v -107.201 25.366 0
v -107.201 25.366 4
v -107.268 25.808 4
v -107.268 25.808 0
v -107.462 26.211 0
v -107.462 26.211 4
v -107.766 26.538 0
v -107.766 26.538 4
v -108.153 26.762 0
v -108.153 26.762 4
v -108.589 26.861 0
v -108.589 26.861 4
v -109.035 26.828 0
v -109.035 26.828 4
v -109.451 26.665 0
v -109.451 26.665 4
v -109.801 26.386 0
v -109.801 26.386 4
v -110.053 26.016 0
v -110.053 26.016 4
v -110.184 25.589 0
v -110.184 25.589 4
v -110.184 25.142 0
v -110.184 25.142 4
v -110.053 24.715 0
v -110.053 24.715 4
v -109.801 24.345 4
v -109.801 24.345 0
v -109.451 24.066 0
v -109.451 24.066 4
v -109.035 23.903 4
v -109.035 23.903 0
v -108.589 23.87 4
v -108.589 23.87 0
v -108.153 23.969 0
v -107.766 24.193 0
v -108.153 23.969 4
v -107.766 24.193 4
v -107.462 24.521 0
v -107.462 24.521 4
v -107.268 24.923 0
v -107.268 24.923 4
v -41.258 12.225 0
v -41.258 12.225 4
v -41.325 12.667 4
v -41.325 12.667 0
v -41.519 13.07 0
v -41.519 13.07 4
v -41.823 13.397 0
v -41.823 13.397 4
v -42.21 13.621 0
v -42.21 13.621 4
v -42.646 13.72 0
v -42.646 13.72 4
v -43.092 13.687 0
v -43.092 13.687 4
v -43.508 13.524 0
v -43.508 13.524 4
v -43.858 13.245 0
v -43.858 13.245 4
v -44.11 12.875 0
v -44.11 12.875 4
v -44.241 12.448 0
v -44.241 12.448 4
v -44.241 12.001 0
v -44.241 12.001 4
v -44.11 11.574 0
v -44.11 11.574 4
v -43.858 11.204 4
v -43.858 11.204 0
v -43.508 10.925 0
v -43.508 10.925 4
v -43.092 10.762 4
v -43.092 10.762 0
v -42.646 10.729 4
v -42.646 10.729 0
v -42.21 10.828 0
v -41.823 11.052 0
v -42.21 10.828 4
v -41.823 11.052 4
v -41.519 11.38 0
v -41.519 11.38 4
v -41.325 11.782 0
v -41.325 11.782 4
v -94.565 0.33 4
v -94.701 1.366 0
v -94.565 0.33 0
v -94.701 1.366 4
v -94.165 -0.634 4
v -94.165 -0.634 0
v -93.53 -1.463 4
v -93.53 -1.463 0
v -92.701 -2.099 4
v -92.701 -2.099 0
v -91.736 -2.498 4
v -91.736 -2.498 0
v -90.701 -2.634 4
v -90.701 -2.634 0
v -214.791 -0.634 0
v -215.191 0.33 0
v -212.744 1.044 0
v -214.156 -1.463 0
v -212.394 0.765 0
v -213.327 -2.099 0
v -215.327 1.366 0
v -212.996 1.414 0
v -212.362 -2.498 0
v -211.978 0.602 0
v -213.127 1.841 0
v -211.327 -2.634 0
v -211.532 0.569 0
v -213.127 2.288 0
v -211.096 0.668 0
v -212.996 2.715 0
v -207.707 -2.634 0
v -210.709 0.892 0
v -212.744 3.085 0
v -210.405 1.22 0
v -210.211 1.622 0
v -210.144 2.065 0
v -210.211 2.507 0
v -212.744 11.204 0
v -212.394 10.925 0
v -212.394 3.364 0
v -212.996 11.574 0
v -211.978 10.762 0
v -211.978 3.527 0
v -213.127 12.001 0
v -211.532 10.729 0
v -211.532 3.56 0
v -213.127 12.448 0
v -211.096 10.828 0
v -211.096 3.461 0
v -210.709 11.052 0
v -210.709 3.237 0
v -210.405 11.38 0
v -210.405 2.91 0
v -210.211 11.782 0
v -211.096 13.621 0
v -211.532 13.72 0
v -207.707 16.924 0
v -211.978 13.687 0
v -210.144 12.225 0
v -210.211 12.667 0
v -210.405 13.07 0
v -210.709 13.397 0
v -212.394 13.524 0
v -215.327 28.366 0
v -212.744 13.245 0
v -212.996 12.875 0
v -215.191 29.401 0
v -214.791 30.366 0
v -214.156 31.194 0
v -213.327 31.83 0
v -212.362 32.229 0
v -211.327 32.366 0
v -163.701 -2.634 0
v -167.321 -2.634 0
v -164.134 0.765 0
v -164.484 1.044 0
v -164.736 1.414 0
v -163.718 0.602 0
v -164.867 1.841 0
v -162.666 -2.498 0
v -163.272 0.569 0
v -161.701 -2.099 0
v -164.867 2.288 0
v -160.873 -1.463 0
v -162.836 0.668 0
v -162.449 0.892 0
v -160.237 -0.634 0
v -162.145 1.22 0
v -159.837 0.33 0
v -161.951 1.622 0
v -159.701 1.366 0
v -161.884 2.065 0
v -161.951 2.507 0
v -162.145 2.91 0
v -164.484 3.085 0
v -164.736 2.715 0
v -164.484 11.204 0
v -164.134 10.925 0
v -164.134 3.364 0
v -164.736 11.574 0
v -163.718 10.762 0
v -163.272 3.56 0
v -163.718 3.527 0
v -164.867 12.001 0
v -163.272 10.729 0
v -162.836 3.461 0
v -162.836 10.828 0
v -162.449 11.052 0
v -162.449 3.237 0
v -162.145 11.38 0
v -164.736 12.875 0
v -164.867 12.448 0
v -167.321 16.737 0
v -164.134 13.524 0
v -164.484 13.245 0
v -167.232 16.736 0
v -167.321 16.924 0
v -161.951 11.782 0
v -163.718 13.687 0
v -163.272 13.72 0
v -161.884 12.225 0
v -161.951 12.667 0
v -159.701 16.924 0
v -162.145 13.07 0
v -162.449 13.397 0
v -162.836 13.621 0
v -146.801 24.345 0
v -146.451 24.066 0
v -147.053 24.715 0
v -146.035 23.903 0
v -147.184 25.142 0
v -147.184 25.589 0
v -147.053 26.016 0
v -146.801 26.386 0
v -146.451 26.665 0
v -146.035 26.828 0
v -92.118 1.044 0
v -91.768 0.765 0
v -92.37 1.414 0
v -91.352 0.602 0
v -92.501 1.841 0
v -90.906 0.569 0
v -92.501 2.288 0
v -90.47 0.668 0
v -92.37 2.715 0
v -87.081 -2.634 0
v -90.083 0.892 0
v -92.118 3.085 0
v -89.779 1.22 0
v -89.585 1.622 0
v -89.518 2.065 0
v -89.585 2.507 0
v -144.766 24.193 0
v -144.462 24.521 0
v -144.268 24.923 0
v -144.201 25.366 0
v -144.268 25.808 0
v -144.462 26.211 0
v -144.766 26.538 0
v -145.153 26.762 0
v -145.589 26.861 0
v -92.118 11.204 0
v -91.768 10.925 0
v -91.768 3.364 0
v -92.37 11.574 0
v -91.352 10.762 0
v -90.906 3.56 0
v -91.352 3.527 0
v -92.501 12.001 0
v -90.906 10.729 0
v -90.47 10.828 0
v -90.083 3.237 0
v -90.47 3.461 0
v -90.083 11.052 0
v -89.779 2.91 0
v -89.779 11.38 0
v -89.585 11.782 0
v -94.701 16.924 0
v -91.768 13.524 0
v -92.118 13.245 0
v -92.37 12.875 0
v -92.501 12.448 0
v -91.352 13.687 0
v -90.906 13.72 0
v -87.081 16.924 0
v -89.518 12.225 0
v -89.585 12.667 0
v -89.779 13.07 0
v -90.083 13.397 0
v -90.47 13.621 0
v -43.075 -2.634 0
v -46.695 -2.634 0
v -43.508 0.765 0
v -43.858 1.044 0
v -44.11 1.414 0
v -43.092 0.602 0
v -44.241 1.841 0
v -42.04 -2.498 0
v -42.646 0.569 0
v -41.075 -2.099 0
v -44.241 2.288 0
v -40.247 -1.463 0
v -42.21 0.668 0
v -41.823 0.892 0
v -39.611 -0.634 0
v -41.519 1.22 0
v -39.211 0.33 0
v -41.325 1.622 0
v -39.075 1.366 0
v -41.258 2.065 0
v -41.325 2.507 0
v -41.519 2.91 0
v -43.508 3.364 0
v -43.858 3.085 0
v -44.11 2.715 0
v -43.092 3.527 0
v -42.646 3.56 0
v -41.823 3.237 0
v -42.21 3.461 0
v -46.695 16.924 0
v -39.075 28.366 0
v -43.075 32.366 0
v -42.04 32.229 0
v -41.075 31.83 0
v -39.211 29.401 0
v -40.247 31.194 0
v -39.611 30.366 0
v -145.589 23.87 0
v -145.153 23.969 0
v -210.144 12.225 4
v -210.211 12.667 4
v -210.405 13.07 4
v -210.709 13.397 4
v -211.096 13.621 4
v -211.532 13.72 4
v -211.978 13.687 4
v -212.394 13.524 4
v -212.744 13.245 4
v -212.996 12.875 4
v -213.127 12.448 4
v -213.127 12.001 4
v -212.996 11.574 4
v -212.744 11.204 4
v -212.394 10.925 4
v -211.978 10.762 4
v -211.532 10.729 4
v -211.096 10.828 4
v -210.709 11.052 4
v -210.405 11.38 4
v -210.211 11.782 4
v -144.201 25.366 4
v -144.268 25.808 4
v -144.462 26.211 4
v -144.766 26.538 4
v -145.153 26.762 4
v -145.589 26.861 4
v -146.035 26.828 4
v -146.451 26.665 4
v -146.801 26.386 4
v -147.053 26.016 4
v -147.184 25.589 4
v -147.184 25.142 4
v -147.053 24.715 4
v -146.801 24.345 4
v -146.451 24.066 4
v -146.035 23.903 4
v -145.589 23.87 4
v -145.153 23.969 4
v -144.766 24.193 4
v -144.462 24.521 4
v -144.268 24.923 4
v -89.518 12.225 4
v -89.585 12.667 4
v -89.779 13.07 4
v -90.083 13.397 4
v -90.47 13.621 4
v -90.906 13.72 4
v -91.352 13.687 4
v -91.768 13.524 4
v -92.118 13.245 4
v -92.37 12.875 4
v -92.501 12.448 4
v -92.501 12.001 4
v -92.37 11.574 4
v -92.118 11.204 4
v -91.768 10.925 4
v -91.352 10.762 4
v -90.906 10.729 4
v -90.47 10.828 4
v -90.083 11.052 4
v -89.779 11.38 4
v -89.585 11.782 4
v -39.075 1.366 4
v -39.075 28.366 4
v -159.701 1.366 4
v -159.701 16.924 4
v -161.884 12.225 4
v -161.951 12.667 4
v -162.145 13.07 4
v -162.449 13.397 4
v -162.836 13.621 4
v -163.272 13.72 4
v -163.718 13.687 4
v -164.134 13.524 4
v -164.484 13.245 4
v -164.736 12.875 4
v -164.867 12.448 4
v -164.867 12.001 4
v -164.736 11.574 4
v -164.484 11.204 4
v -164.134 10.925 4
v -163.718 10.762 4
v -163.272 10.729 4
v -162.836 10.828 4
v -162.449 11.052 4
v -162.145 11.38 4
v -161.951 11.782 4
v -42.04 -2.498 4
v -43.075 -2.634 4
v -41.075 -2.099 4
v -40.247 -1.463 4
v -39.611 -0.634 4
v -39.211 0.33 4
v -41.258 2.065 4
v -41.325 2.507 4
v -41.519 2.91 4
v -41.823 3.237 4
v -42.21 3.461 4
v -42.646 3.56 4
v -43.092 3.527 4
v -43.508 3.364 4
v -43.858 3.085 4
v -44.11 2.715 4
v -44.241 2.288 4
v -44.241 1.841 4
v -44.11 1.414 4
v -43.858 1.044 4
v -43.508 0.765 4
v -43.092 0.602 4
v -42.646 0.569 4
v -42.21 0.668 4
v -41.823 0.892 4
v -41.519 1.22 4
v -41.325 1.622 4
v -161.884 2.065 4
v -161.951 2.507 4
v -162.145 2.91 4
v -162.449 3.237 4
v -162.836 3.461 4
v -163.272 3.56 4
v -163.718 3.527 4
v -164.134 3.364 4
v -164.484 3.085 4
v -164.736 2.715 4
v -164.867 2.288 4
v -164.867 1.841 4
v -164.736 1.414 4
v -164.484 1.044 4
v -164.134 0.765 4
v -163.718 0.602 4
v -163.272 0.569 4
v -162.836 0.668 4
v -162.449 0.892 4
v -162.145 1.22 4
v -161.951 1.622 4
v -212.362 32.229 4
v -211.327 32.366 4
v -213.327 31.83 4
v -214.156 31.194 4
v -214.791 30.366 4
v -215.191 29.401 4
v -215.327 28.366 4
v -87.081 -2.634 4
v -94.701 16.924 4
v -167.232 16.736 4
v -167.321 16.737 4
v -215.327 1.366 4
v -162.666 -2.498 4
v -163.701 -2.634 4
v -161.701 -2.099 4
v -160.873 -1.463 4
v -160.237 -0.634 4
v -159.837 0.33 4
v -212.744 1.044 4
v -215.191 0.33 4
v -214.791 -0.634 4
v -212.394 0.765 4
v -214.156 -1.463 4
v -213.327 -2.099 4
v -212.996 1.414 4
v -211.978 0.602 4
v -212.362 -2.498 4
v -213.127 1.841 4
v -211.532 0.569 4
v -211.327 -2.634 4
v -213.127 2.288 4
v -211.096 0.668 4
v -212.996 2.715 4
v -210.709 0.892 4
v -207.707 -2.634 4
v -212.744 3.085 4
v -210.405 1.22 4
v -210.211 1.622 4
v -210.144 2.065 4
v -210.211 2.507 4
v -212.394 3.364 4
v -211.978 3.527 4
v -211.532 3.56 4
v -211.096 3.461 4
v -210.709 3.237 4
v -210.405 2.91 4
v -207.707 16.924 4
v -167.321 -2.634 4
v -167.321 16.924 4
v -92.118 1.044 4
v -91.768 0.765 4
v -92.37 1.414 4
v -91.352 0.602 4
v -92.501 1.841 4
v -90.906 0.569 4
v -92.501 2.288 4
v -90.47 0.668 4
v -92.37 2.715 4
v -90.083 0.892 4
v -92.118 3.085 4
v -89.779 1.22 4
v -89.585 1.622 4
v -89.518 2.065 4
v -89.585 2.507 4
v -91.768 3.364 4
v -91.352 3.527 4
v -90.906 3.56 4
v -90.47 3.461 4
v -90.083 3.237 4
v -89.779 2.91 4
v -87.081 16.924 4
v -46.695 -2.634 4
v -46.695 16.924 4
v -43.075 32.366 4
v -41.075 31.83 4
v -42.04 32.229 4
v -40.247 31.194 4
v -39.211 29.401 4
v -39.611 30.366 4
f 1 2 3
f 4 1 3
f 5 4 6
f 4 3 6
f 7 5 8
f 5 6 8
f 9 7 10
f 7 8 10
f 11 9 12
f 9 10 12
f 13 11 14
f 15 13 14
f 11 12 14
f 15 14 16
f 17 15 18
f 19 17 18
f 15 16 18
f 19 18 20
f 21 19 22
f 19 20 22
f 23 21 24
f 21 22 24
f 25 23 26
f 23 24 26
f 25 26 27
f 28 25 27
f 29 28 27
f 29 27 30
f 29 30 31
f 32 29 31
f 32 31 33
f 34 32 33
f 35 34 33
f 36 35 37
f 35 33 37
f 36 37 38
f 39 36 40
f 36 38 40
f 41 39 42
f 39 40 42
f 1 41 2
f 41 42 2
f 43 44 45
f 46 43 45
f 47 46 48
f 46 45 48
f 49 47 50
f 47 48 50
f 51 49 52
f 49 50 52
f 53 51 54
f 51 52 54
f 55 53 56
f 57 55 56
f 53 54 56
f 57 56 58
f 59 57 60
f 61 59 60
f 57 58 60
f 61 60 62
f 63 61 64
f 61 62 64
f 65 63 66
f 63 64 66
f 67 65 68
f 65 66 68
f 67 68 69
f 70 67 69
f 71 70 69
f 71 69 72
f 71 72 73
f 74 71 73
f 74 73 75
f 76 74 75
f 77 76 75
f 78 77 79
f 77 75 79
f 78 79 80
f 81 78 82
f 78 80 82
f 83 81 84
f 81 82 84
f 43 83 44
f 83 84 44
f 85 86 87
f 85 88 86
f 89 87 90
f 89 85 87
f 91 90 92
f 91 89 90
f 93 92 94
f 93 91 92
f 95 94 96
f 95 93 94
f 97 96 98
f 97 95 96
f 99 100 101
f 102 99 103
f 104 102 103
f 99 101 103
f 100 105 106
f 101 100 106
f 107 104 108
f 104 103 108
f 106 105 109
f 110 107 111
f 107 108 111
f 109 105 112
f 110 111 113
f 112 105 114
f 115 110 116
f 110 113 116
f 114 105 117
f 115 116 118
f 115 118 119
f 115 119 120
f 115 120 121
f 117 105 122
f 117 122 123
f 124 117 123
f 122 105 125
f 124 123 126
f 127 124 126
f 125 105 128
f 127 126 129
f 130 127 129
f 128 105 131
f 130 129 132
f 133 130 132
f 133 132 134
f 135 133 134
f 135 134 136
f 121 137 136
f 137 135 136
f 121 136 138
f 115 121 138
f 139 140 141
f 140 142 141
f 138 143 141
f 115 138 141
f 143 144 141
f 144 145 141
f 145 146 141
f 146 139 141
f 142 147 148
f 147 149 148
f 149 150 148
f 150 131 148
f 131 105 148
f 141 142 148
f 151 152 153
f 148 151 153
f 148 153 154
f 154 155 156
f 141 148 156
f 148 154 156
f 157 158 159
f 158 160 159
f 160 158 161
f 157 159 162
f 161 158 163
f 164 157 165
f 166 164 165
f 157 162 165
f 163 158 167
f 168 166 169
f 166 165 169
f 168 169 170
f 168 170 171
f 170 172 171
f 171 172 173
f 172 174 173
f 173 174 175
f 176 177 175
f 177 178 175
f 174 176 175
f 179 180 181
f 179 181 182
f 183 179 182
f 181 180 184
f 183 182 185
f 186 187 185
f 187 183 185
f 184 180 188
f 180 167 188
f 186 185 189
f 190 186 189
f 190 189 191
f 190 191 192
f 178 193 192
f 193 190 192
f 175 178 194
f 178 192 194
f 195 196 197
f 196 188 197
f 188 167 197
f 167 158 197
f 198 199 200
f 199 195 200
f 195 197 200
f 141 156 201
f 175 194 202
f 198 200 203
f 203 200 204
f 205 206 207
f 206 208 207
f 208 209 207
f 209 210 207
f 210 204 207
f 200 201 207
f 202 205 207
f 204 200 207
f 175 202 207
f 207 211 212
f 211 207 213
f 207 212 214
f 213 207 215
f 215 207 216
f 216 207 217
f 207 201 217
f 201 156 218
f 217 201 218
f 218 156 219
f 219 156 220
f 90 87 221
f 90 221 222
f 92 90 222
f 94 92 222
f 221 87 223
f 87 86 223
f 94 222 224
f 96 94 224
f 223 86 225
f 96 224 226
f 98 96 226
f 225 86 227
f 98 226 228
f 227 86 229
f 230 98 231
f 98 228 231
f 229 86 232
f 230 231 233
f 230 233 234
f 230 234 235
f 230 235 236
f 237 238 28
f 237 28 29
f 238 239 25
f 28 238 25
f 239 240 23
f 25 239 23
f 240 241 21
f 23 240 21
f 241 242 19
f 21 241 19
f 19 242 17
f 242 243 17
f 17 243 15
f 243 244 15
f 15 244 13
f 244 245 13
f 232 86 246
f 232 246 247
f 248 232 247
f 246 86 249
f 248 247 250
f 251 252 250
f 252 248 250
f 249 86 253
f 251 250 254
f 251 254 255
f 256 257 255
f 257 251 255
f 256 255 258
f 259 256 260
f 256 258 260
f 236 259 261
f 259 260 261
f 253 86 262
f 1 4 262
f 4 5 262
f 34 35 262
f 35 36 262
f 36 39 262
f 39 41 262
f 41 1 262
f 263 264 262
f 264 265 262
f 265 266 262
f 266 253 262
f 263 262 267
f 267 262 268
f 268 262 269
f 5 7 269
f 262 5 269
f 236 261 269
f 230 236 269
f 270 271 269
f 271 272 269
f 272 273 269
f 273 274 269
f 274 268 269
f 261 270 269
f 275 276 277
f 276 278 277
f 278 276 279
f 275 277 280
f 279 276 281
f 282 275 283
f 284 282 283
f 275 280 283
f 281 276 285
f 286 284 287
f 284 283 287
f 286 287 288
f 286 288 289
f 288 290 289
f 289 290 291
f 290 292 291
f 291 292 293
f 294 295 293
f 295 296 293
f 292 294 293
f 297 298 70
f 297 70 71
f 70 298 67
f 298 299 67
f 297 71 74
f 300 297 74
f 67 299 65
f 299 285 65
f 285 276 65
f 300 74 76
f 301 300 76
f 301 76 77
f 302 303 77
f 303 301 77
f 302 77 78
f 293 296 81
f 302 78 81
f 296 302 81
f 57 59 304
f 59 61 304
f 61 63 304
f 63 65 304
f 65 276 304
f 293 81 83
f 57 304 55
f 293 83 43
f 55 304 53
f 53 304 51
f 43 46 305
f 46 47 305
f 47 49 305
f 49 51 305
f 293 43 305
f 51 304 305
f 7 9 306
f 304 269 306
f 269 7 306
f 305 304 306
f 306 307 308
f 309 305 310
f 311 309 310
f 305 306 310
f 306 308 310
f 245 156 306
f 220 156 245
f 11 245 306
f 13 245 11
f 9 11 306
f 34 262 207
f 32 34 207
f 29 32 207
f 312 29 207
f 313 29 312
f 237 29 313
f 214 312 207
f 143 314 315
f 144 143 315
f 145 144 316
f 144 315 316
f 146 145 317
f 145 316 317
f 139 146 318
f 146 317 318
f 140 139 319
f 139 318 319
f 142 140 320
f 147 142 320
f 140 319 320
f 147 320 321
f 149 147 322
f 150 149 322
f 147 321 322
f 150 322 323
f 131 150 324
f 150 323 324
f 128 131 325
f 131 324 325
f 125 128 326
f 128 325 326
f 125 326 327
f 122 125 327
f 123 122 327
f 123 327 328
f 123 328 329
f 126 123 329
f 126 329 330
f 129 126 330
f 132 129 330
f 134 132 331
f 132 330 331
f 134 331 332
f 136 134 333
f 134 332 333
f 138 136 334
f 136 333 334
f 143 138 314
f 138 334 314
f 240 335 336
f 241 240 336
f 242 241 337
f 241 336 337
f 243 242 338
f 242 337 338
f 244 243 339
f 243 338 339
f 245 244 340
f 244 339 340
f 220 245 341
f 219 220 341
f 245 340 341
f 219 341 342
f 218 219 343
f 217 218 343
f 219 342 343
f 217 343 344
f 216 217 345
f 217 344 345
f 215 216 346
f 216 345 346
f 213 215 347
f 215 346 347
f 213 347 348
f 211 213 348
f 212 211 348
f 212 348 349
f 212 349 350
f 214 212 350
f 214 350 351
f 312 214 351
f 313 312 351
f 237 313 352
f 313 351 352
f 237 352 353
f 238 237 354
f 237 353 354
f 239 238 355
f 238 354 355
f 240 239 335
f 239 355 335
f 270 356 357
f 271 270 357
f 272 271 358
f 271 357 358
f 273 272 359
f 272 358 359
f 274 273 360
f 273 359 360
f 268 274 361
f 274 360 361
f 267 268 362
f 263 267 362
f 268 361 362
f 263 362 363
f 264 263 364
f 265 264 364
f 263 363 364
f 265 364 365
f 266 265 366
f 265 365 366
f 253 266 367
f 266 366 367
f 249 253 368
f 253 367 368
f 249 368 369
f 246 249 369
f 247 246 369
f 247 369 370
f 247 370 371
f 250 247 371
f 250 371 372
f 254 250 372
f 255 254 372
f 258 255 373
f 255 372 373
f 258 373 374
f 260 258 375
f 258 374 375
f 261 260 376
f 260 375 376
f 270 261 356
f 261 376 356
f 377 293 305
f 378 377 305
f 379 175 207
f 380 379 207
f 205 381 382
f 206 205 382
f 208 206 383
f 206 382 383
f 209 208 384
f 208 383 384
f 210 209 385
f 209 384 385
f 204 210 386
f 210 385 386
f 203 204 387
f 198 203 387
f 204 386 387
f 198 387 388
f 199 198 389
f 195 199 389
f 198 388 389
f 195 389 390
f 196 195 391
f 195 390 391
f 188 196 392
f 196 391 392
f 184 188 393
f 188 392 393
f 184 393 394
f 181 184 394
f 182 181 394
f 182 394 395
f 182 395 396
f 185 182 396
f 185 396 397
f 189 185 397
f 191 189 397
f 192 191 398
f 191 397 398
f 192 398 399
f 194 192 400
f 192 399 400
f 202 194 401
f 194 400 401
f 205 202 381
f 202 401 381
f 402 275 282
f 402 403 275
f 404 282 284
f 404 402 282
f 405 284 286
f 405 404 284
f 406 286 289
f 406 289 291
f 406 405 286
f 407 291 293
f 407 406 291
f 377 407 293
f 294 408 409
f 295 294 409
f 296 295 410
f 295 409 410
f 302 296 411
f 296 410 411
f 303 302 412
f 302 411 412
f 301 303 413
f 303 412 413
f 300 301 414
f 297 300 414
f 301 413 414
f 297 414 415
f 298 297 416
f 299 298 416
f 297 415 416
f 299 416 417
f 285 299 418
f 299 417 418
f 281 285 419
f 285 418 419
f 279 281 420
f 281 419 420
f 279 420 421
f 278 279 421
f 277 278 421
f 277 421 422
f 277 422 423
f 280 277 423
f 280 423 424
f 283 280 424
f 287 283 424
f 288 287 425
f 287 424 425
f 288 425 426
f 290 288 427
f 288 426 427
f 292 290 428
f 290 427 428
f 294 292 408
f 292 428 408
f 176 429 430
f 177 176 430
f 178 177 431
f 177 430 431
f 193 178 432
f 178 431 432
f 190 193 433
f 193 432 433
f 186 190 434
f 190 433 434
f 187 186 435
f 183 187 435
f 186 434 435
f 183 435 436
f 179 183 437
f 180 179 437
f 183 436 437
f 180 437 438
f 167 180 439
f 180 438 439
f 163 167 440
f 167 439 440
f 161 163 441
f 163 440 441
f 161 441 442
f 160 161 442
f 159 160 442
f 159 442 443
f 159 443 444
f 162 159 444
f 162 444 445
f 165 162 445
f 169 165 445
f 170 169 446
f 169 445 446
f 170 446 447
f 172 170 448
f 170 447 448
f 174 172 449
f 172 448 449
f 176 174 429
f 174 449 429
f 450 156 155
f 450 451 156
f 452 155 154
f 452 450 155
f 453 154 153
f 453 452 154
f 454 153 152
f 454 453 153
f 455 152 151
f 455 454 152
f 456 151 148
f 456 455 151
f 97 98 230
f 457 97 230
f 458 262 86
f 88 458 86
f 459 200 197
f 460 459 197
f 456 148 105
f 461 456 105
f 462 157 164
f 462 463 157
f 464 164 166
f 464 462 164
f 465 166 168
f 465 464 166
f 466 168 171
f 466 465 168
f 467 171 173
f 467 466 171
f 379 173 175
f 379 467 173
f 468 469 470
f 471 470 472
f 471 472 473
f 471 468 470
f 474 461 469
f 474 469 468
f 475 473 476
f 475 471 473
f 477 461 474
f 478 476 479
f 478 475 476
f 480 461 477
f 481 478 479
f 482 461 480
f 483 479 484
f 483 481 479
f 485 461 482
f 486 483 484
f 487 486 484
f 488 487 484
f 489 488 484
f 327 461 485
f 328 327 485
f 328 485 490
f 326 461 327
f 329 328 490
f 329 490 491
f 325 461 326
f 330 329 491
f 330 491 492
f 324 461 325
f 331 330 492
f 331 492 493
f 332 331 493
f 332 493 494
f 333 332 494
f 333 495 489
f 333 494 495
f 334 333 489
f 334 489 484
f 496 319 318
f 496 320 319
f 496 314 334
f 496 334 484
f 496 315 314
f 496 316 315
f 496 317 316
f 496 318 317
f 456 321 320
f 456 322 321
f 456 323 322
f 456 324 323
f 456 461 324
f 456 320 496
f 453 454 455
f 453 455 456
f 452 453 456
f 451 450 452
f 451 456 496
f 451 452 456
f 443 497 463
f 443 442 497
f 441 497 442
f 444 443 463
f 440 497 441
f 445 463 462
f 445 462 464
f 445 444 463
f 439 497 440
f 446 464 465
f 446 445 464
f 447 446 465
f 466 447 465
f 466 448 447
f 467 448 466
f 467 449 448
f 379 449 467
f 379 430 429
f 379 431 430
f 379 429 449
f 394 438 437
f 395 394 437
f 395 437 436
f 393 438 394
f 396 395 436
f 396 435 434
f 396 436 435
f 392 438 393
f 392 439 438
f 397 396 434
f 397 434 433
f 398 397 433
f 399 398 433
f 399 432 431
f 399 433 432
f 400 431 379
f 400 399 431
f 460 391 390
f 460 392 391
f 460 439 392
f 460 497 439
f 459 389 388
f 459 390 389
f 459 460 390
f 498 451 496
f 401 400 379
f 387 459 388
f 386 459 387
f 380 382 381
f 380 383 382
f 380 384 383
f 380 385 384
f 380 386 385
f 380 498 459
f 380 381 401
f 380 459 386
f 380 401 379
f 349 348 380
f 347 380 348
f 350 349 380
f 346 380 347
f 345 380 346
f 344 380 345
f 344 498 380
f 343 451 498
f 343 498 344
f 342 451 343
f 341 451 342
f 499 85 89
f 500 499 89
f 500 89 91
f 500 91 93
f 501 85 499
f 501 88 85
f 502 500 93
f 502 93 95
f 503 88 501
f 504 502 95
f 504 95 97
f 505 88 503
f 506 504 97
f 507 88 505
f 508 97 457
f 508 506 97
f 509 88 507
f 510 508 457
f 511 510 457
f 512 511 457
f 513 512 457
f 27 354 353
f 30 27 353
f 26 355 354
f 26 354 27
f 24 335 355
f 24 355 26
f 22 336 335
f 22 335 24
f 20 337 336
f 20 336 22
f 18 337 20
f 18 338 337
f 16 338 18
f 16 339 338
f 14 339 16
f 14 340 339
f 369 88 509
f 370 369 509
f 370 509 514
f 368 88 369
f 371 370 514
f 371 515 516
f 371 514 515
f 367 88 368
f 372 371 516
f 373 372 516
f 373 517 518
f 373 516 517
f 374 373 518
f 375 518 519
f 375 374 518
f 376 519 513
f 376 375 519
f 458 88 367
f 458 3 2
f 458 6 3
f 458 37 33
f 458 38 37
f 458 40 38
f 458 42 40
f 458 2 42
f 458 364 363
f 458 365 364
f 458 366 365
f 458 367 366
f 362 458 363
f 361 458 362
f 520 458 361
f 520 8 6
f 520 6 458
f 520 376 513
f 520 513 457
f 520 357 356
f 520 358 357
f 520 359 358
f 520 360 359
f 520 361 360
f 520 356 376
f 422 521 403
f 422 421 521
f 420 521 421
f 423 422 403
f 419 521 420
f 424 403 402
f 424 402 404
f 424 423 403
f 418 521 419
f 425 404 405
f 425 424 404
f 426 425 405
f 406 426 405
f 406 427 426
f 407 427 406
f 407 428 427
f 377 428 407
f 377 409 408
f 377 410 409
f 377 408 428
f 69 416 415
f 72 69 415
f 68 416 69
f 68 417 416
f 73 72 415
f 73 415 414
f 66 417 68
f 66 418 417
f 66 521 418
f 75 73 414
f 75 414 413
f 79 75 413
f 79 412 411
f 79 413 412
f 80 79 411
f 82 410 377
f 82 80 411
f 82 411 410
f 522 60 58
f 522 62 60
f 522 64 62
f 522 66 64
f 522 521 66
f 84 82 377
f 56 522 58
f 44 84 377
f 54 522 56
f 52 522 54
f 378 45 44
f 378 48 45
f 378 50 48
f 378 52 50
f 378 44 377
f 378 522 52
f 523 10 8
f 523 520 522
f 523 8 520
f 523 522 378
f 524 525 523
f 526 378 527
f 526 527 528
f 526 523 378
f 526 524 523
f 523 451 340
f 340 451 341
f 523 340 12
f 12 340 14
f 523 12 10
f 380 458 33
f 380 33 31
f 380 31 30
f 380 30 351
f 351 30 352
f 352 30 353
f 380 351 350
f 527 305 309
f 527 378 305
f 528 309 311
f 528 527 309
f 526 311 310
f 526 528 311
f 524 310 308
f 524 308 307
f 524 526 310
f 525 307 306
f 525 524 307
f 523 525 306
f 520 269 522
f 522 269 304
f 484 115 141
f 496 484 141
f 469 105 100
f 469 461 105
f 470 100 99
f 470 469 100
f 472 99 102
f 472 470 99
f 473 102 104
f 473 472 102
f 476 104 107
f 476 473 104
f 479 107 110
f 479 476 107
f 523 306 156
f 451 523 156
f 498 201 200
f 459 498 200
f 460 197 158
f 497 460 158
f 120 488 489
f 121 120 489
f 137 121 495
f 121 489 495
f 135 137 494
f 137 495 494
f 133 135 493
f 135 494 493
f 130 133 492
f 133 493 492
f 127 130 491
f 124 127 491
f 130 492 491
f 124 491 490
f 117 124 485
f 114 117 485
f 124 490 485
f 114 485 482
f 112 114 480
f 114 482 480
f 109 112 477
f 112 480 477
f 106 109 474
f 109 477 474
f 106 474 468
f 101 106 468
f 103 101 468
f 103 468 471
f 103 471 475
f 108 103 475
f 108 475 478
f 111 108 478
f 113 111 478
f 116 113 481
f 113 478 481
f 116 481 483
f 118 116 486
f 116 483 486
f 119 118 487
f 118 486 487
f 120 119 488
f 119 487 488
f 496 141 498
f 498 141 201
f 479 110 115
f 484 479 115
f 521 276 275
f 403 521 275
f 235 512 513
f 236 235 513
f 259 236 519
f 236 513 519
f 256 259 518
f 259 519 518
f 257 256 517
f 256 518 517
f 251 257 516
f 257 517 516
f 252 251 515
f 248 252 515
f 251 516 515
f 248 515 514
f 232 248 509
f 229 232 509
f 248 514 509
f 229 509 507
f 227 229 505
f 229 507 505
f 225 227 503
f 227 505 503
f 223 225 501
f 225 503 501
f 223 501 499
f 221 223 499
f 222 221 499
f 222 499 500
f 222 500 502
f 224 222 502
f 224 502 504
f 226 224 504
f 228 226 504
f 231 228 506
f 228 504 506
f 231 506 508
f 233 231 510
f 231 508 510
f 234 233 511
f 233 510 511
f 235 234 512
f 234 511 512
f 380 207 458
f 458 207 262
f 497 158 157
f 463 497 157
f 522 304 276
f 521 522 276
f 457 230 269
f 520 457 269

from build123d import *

# Parameters (mm, degrees)
BOSS_EXTRUDE2_DEPTH = 4
FILLET1_R           = 4
SKETCH6_R           = 1.5
CUT_EXTRUDE1_DEPTH  = 4
SKETCH3_R           = 1.5
CUT_EXTRUDE2_DEPTH  = 4


with BuildPart() as part:
    # Sketch2 → Boss-Extrude2 (new body)
    with BuildSketch(Plane.XY):
        Polygon((-87.081093968, -2.634474623), (-87.081093968, 16.923525377), (-46.695093968, 16.923525377), (-46.695093968, -2.634474623), (-39.075093968, -2.634474623), (-39.075093968, 32.365525377), (-67.081093968, 32.365525377), (-74.701093968, 32.365525377), (-159.701093968, 32.365525377), (-167.321093968, 32.365525377), (-215.327093968, 32.365525377), (-215.327093968, -2.634474623), (-207.707093968, -2.634474623), (-207.707093968, 16.923525377), (-167.321093968, 16.923525377), (-167.231910297, 16.736340115), (-167.321093968, 16.736752562), (-167.321093968, -2.634474623), (-159.701093968, -2.634474623), (-159.701093968, 16.923525377), (-94.701093968, 16.923525377), (-94.701093968, -2.634474623), align=None)
    extrude(amount=BOSS_EXTRUDE2_DEPTH)

    # Fillet1
    fillet1_edges = [part.edges().sort_by_distance(p)[0] for p in [
        (-39.075093968, 32.365525377, 2),
        (-39.075093968, -2.634474623, 2),
        (-94.701093968, -2.634474623, 2),
        (-159.701093968, -2.634474623, 2),
        (-215.327093968, -2.634474623, 2),
        (-215.327093968, 32.365525377, 2),
    ]]
    fillet(fillet1_edges, radius=FILLET1_R)

    # Sketch6 → Cut-Extrude1 (cut)
    with BuildSketch(Plane.XY.offset(4)):
        with Locations((-211.644093968, 12.224525377)):
            Circle(SKETCH6_R)
        with Locations((-163.384093968, 12.224525377)):
            Circle(SKETCH6_R)
        with Locations((-163.384093968, 2.064525377)):
            Circle(SKETCH6_R)
        with Locations((-211.644093968, 2.064525377)):
            Circle(SKETCH6_R)
        with Locations((-91.018093968, 12.224525377)):
            Circle(SKETCH6_R)
        with Locations((-42.758093968, 12.224525377)):
            Circle(SKETCH6_R)
        with Locations((-42.758093968, 2.064525377)):
            Circle(SKETCH6_R)
        with Locations((-91.018093968, 2.064525377)):
            Circle(SKETCH6_R)
    extrude(amount=-CUT_EXTRUDE1_DEPTH, mode=Mode.SUBTRACT)

    # Sketch3 → Cut-Extrude2 (cut)
    with BuildSketch(Plane.XY.offset(4)):
        with Locations((-145.701093968, 25.365525377)):
            Circle(SKETCH3_R)
        with Locations((-108.701093968, 25.365525377)):
            Circle(SKETCH3_R)
    extrude(amount=-CUT_EXTRUDE2_DEPTH, mode=Mode.SUBTRACT)


solid = part.part
